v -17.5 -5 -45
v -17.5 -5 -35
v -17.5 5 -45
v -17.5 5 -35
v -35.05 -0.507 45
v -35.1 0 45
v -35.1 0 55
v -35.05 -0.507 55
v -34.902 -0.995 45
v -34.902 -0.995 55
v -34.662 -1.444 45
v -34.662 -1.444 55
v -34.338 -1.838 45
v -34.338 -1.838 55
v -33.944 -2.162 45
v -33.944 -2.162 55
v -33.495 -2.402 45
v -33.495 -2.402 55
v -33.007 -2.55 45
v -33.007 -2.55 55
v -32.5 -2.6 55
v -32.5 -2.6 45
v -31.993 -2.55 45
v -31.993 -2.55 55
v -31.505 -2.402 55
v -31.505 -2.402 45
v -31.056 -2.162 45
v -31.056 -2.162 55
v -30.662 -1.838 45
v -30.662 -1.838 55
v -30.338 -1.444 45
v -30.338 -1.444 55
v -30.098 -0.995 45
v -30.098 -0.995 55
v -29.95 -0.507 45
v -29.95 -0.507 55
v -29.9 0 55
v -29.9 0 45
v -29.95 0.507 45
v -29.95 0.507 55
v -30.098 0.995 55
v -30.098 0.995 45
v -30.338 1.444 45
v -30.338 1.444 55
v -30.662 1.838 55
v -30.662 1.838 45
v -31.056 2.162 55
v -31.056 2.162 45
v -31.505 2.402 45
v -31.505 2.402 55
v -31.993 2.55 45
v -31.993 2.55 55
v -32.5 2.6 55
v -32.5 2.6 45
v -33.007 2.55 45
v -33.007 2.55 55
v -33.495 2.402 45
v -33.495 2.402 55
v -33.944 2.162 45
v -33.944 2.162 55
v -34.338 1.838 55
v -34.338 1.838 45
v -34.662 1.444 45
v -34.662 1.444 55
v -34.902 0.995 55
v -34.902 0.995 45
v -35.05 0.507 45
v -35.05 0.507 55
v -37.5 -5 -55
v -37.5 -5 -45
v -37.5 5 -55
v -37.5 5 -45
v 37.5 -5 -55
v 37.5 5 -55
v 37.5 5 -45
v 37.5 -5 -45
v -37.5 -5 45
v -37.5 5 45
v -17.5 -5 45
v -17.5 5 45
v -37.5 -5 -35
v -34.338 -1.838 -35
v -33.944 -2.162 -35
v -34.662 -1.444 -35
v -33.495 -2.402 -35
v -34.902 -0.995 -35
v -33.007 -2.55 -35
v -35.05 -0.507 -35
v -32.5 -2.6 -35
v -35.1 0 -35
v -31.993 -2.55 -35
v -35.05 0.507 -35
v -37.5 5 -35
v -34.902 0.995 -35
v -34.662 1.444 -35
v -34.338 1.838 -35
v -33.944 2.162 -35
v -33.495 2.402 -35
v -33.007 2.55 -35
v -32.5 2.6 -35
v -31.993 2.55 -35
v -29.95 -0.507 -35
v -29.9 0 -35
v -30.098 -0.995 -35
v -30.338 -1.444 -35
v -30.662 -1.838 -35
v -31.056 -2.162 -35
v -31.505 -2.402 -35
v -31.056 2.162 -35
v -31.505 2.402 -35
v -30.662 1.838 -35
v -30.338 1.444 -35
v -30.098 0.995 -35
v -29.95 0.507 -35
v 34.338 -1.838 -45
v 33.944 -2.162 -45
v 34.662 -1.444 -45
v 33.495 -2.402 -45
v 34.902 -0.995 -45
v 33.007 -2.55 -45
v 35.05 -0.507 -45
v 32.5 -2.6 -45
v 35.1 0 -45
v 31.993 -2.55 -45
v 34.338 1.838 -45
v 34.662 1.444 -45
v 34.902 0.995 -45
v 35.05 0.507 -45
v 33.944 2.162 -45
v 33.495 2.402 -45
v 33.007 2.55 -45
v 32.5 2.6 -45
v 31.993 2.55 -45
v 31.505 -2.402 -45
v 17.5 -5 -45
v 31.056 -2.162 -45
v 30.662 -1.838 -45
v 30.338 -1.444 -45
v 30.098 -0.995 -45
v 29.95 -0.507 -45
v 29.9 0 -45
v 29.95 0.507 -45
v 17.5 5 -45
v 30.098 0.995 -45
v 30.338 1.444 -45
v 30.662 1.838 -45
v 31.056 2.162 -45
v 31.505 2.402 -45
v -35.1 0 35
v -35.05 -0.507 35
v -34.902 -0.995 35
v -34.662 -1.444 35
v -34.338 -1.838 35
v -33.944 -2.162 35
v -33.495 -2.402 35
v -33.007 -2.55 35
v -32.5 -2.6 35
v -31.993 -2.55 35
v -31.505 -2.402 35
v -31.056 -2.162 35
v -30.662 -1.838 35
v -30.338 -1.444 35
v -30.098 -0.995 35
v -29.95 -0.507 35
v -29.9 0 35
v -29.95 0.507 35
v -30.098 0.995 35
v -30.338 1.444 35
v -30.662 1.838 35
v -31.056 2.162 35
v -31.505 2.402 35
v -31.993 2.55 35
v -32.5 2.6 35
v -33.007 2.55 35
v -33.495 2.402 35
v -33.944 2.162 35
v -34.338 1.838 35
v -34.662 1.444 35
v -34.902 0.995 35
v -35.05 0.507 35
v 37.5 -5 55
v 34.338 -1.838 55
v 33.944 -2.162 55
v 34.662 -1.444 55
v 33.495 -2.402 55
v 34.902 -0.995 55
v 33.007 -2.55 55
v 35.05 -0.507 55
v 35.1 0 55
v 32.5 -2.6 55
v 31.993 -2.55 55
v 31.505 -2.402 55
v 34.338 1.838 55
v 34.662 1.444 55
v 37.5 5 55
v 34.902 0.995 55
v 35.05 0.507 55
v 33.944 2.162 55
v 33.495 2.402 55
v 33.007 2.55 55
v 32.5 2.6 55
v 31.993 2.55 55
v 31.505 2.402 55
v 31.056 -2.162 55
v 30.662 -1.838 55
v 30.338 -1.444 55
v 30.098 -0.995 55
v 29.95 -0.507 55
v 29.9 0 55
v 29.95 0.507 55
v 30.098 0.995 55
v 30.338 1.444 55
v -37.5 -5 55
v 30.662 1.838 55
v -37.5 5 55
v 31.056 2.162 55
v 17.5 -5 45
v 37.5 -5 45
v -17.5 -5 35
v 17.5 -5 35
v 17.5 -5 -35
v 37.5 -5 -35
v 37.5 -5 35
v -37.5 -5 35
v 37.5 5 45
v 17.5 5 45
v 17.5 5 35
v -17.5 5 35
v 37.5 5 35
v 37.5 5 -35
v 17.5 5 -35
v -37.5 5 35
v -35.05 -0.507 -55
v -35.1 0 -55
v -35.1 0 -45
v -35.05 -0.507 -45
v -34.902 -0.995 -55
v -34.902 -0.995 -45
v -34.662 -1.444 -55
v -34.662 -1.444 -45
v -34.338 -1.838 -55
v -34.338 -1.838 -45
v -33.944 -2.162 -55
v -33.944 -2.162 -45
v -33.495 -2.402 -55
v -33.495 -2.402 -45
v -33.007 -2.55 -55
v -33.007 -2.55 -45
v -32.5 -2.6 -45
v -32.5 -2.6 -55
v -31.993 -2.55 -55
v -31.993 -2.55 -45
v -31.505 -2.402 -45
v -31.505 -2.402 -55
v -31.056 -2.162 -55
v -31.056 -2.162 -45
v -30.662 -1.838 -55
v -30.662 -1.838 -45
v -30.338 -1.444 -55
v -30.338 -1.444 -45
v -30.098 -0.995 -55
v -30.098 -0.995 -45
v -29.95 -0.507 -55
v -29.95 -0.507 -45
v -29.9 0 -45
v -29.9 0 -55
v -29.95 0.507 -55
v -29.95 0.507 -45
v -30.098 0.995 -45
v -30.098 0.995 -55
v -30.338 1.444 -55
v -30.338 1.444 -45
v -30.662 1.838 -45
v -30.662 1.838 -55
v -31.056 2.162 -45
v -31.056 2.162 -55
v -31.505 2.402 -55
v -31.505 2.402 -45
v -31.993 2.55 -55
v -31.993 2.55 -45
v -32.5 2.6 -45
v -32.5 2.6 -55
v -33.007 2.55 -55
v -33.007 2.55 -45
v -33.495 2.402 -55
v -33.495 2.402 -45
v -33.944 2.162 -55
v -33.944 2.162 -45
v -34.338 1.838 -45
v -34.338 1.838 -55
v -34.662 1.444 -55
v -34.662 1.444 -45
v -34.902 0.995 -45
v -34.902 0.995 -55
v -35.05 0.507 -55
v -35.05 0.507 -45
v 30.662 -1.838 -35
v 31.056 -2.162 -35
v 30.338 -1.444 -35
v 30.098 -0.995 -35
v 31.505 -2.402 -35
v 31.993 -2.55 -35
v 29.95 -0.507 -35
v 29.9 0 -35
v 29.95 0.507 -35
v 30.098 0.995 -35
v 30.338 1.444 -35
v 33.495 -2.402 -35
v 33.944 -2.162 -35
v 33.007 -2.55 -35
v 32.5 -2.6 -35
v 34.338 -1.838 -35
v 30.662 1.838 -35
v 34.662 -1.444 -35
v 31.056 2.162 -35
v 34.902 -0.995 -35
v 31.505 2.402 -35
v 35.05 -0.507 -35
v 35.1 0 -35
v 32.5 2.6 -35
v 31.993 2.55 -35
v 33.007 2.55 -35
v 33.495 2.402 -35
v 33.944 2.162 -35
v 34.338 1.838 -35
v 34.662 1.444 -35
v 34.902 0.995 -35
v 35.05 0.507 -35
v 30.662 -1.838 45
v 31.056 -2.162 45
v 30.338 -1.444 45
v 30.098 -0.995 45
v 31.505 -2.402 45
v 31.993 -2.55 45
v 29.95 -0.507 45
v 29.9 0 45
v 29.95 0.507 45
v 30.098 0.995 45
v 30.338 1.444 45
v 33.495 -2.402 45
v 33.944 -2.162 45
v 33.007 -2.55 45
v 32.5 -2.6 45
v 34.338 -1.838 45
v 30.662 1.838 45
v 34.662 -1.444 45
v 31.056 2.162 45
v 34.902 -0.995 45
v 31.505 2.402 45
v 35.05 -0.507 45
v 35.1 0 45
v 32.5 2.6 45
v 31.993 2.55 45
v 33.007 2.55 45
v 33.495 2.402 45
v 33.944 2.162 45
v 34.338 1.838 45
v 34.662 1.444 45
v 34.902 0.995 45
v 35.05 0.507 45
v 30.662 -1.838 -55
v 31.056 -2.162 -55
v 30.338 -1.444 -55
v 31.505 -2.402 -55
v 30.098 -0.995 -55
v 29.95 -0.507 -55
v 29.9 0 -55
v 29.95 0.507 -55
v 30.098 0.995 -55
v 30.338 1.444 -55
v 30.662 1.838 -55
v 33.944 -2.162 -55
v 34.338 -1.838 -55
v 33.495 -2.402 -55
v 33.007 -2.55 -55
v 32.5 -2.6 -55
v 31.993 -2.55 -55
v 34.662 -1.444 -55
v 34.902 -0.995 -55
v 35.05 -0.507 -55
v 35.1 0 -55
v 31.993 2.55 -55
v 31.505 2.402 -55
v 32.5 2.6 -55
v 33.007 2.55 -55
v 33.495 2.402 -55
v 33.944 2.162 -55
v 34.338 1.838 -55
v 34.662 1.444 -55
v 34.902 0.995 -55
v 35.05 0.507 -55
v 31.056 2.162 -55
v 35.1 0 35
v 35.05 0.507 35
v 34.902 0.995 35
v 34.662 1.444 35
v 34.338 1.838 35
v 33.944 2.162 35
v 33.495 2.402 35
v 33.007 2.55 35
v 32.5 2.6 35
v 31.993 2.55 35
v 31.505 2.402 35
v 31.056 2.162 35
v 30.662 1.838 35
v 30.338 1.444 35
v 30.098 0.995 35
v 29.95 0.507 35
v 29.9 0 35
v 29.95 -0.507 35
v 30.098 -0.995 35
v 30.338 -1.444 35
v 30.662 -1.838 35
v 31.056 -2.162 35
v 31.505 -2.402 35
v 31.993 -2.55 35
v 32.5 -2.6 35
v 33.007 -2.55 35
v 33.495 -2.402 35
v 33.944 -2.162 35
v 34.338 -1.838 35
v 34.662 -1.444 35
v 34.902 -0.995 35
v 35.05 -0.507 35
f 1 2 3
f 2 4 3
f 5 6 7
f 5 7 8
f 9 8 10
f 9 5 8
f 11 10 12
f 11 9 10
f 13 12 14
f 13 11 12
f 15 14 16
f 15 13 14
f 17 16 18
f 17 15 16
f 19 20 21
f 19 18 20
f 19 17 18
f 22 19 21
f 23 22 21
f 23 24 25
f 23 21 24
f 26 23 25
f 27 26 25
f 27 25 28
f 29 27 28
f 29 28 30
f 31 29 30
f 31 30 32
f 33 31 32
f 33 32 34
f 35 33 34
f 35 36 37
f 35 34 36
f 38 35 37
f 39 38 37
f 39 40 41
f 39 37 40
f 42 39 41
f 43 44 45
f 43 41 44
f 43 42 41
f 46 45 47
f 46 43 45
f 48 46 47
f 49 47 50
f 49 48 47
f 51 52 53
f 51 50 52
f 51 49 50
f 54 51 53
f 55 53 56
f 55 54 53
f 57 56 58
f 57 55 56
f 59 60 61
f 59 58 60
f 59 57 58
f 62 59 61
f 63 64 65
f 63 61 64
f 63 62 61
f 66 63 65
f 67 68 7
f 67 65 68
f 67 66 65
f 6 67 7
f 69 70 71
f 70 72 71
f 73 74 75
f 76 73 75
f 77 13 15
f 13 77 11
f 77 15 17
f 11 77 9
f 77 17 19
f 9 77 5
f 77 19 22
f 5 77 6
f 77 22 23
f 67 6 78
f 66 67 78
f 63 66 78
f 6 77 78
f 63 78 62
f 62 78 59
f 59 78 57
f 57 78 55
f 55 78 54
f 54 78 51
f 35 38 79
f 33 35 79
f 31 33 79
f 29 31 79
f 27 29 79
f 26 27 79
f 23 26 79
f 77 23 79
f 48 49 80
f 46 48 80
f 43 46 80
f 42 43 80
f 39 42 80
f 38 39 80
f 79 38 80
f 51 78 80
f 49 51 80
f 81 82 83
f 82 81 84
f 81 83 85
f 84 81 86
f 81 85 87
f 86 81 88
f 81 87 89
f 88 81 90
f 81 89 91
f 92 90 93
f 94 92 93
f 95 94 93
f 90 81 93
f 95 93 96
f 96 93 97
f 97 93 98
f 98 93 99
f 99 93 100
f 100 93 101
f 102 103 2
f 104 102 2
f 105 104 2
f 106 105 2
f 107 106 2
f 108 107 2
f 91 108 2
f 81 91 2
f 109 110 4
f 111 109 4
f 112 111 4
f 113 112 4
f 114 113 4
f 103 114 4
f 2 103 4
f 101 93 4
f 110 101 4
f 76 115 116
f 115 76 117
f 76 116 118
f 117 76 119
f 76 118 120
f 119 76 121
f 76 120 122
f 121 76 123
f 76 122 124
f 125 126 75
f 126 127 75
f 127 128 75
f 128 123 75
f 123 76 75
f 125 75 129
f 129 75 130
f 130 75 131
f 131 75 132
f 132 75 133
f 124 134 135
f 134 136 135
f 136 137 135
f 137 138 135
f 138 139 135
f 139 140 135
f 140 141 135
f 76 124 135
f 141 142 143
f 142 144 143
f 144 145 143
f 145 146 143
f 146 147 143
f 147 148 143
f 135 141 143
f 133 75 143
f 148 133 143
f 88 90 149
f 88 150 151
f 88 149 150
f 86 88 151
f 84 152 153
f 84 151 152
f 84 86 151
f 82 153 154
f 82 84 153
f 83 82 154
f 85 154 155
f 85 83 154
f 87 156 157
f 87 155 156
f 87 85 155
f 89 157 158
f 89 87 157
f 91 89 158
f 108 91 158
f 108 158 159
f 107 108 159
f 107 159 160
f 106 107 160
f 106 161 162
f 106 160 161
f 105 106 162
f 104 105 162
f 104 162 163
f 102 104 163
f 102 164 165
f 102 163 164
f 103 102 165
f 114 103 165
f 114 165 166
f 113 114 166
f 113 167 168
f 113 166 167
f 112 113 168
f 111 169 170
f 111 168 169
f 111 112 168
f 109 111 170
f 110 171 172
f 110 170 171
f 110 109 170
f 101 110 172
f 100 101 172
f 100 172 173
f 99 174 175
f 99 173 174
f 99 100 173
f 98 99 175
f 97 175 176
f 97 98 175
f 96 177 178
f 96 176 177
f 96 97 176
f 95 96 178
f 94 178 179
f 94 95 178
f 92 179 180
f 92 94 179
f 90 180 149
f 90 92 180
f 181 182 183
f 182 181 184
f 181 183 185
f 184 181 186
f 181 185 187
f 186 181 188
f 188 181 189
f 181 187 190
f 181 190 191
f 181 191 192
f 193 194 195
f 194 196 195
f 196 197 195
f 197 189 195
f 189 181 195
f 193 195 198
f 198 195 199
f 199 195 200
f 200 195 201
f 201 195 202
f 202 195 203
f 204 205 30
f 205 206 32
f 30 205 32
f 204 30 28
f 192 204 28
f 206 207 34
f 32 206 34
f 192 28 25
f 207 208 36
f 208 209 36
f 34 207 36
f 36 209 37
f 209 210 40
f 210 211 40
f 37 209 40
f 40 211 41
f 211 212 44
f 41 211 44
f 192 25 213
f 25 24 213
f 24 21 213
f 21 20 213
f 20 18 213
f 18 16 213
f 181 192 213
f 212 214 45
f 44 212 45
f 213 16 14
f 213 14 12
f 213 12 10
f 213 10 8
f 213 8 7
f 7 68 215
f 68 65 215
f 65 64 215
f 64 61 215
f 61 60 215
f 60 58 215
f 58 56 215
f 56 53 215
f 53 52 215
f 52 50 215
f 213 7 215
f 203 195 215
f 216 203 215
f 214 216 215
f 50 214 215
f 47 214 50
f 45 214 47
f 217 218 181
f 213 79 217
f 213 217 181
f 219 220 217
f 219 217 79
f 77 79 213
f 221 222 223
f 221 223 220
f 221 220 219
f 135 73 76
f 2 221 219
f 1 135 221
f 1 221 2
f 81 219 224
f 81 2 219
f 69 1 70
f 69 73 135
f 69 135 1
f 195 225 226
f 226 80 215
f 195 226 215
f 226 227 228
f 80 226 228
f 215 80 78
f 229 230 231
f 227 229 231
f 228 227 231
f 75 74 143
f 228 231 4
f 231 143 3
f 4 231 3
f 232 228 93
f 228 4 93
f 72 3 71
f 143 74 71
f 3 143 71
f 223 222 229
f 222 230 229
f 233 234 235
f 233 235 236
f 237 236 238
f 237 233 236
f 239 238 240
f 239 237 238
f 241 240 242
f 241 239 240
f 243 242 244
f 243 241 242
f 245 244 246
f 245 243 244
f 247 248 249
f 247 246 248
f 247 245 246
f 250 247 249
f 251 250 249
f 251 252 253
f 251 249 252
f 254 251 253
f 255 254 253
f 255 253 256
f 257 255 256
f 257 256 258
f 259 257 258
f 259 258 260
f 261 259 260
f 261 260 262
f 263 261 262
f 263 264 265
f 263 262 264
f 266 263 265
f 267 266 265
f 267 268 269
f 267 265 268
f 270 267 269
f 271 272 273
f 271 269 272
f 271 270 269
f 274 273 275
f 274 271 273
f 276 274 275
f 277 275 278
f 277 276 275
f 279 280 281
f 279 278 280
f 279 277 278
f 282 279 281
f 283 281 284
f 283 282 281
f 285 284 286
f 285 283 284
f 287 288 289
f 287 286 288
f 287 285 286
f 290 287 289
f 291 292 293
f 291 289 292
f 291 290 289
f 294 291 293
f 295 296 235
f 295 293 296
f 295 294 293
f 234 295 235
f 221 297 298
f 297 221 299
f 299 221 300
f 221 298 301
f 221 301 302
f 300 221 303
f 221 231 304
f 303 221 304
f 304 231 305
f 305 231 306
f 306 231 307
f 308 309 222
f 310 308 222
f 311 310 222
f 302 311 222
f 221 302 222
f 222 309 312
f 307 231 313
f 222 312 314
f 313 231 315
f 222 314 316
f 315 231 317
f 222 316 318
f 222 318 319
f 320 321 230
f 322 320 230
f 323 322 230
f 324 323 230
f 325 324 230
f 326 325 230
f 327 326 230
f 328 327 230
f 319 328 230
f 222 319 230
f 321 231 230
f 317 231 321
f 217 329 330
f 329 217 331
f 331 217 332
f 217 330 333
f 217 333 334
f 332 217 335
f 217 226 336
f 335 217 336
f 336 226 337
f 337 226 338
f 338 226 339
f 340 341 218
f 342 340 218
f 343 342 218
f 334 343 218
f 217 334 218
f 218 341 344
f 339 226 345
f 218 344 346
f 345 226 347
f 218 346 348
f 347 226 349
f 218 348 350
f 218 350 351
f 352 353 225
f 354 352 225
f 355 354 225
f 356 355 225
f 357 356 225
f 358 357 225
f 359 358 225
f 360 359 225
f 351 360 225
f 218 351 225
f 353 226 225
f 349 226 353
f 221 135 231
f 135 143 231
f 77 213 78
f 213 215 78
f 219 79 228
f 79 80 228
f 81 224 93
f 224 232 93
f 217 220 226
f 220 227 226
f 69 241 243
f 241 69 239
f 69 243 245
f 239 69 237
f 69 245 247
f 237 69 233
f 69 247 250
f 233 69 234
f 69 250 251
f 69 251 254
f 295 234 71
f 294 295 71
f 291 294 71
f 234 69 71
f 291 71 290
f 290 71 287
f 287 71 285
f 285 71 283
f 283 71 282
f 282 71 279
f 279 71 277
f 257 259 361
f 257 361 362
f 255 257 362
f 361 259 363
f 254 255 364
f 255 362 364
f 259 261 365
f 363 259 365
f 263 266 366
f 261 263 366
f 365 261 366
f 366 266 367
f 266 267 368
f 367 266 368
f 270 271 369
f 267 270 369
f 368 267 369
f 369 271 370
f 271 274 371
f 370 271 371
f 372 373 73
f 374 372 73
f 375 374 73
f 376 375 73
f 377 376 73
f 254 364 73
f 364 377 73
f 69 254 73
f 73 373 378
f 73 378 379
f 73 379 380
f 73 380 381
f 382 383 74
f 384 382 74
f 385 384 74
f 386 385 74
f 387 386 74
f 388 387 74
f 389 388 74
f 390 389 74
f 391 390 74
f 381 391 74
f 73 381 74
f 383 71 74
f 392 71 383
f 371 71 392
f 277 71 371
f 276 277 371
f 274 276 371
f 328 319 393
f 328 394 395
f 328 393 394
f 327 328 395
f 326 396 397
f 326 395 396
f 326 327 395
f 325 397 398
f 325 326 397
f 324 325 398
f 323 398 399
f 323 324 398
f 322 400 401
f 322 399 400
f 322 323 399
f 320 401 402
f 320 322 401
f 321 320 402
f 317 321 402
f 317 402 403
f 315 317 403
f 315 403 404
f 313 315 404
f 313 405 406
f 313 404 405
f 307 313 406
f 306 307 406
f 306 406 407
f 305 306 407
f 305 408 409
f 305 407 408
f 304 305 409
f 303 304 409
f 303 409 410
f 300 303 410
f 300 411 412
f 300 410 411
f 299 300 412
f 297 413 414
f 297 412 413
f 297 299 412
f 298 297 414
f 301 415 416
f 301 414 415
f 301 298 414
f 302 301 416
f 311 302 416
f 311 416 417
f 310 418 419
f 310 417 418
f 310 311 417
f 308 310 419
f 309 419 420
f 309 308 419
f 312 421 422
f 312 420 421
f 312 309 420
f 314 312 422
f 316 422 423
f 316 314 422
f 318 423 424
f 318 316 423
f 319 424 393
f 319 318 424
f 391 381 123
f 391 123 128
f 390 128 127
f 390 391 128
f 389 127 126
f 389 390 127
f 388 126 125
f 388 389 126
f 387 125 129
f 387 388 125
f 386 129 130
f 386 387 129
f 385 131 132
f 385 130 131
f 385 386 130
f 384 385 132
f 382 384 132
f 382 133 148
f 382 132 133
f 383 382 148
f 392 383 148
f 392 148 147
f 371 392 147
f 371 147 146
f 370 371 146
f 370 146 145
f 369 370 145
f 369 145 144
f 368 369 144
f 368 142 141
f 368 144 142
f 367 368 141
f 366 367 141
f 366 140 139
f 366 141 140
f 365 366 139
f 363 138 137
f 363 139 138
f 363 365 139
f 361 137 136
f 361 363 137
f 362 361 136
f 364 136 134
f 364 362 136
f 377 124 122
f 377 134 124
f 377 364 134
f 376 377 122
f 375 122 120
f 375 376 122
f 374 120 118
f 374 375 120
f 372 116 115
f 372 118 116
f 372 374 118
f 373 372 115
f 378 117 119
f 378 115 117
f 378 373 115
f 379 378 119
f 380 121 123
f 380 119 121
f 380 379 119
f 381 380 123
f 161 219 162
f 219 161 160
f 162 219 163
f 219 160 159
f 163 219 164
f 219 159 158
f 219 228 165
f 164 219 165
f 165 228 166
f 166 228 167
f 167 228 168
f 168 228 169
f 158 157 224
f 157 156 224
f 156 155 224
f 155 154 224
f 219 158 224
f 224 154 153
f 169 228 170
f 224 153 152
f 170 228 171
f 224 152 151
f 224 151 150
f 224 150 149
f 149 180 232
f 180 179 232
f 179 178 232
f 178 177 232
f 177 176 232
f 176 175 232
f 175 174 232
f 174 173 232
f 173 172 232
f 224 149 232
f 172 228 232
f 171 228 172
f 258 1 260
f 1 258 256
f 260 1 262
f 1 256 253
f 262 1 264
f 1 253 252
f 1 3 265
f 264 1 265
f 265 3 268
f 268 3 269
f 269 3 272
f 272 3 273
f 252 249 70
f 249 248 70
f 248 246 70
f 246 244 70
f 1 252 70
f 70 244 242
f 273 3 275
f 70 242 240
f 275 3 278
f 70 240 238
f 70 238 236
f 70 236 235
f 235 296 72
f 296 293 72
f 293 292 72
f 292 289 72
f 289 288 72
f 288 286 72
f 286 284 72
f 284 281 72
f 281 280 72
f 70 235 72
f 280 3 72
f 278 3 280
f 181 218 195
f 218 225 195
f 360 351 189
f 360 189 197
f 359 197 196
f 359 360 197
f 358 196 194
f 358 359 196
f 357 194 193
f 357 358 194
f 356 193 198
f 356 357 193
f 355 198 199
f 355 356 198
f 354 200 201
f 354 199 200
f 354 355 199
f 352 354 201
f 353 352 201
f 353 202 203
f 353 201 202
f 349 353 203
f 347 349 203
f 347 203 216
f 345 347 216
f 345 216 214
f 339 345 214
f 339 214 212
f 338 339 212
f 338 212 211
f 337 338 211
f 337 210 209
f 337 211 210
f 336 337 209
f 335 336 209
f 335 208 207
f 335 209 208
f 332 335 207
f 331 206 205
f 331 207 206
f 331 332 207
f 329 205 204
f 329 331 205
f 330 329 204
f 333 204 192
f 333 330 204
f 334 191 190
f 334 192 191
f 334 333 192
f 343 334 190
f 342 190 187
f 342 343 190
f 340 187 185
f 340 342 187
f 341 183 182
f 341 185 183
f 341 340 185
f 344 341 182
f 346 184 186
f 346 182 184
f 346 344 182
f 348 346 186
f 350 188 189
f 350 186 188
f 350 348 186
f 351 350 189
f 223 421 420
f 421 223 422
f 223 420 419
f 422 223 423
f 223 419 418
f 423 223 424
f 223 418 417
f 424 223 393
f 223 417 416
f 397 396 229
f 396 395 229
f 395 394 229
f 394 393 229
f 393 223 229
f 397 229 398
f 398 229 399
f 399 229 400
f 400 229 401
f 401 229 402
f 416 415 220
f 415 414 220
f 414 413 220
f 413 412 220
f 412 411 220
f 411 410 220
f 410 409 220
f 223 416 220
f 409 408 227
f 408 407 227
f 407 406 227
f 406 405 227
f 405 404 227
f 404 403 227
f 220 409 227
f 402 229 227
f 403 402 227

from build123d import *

# Parameters (mm, degrees)
SALIENTE_EXTRUIR1_DEPTH    = 5
CORTAR_EXTRUIR1_DEPTH      = 67.755149614
CORTAR_EXTRUIR1_DEPTH_BACK = 67.755149614
CROQUIS2_R                 = 2.6


with BuildPart() as part:
    # Croquis1 → Saliente-Extruir1 (new, symmetric)
    with BuildSketch(Plane(origin=(0, 0, 0), x_dir=(1, 0, 0), z_dir=(0, 1, 0))):
        Polygon((37.5, 45), (17.5, 45), (17.5, 35), (37.5, 35), (37.5, -35), (17.5, -35), (17.5, -45), (37.5, -45), (37.5, -55), (-37.5, -55), (-37.5, -45), (-17.5, -45), (-17.5, -35), (-37.5, -35), (-37.5, 35), (-17.5, 35), (-17.5, 45), (-37.5, 45), (-37.5, 55), (37.5, 55), align=None)
    extrude(amount=SALIENTE_EXTRUIR1_DEPTH, both=True)

    # Croquis2 → Cortar-Extruir1 (cut, two sides: drawn at the far end of the back side and taken through both)
    with BuildSketch(Plane.XY.offset(-CORTAR_EXTRUIR1_DEPTH_BACK)):
        with Locations((32.5, 0)):
            Circle(CROQUIS2_R)
        with Locations(Location((-32.5, 0, 0), (0, 0, 180))):
            Circle(CROQUIS2_R)
    extrude(amount=CORTAR_EXTRUIR1_DEPTH + CORTAR_EXTRUIR1_DEPTH_BACK, mode=Mode.SUBTRACT)


solid = part.part
